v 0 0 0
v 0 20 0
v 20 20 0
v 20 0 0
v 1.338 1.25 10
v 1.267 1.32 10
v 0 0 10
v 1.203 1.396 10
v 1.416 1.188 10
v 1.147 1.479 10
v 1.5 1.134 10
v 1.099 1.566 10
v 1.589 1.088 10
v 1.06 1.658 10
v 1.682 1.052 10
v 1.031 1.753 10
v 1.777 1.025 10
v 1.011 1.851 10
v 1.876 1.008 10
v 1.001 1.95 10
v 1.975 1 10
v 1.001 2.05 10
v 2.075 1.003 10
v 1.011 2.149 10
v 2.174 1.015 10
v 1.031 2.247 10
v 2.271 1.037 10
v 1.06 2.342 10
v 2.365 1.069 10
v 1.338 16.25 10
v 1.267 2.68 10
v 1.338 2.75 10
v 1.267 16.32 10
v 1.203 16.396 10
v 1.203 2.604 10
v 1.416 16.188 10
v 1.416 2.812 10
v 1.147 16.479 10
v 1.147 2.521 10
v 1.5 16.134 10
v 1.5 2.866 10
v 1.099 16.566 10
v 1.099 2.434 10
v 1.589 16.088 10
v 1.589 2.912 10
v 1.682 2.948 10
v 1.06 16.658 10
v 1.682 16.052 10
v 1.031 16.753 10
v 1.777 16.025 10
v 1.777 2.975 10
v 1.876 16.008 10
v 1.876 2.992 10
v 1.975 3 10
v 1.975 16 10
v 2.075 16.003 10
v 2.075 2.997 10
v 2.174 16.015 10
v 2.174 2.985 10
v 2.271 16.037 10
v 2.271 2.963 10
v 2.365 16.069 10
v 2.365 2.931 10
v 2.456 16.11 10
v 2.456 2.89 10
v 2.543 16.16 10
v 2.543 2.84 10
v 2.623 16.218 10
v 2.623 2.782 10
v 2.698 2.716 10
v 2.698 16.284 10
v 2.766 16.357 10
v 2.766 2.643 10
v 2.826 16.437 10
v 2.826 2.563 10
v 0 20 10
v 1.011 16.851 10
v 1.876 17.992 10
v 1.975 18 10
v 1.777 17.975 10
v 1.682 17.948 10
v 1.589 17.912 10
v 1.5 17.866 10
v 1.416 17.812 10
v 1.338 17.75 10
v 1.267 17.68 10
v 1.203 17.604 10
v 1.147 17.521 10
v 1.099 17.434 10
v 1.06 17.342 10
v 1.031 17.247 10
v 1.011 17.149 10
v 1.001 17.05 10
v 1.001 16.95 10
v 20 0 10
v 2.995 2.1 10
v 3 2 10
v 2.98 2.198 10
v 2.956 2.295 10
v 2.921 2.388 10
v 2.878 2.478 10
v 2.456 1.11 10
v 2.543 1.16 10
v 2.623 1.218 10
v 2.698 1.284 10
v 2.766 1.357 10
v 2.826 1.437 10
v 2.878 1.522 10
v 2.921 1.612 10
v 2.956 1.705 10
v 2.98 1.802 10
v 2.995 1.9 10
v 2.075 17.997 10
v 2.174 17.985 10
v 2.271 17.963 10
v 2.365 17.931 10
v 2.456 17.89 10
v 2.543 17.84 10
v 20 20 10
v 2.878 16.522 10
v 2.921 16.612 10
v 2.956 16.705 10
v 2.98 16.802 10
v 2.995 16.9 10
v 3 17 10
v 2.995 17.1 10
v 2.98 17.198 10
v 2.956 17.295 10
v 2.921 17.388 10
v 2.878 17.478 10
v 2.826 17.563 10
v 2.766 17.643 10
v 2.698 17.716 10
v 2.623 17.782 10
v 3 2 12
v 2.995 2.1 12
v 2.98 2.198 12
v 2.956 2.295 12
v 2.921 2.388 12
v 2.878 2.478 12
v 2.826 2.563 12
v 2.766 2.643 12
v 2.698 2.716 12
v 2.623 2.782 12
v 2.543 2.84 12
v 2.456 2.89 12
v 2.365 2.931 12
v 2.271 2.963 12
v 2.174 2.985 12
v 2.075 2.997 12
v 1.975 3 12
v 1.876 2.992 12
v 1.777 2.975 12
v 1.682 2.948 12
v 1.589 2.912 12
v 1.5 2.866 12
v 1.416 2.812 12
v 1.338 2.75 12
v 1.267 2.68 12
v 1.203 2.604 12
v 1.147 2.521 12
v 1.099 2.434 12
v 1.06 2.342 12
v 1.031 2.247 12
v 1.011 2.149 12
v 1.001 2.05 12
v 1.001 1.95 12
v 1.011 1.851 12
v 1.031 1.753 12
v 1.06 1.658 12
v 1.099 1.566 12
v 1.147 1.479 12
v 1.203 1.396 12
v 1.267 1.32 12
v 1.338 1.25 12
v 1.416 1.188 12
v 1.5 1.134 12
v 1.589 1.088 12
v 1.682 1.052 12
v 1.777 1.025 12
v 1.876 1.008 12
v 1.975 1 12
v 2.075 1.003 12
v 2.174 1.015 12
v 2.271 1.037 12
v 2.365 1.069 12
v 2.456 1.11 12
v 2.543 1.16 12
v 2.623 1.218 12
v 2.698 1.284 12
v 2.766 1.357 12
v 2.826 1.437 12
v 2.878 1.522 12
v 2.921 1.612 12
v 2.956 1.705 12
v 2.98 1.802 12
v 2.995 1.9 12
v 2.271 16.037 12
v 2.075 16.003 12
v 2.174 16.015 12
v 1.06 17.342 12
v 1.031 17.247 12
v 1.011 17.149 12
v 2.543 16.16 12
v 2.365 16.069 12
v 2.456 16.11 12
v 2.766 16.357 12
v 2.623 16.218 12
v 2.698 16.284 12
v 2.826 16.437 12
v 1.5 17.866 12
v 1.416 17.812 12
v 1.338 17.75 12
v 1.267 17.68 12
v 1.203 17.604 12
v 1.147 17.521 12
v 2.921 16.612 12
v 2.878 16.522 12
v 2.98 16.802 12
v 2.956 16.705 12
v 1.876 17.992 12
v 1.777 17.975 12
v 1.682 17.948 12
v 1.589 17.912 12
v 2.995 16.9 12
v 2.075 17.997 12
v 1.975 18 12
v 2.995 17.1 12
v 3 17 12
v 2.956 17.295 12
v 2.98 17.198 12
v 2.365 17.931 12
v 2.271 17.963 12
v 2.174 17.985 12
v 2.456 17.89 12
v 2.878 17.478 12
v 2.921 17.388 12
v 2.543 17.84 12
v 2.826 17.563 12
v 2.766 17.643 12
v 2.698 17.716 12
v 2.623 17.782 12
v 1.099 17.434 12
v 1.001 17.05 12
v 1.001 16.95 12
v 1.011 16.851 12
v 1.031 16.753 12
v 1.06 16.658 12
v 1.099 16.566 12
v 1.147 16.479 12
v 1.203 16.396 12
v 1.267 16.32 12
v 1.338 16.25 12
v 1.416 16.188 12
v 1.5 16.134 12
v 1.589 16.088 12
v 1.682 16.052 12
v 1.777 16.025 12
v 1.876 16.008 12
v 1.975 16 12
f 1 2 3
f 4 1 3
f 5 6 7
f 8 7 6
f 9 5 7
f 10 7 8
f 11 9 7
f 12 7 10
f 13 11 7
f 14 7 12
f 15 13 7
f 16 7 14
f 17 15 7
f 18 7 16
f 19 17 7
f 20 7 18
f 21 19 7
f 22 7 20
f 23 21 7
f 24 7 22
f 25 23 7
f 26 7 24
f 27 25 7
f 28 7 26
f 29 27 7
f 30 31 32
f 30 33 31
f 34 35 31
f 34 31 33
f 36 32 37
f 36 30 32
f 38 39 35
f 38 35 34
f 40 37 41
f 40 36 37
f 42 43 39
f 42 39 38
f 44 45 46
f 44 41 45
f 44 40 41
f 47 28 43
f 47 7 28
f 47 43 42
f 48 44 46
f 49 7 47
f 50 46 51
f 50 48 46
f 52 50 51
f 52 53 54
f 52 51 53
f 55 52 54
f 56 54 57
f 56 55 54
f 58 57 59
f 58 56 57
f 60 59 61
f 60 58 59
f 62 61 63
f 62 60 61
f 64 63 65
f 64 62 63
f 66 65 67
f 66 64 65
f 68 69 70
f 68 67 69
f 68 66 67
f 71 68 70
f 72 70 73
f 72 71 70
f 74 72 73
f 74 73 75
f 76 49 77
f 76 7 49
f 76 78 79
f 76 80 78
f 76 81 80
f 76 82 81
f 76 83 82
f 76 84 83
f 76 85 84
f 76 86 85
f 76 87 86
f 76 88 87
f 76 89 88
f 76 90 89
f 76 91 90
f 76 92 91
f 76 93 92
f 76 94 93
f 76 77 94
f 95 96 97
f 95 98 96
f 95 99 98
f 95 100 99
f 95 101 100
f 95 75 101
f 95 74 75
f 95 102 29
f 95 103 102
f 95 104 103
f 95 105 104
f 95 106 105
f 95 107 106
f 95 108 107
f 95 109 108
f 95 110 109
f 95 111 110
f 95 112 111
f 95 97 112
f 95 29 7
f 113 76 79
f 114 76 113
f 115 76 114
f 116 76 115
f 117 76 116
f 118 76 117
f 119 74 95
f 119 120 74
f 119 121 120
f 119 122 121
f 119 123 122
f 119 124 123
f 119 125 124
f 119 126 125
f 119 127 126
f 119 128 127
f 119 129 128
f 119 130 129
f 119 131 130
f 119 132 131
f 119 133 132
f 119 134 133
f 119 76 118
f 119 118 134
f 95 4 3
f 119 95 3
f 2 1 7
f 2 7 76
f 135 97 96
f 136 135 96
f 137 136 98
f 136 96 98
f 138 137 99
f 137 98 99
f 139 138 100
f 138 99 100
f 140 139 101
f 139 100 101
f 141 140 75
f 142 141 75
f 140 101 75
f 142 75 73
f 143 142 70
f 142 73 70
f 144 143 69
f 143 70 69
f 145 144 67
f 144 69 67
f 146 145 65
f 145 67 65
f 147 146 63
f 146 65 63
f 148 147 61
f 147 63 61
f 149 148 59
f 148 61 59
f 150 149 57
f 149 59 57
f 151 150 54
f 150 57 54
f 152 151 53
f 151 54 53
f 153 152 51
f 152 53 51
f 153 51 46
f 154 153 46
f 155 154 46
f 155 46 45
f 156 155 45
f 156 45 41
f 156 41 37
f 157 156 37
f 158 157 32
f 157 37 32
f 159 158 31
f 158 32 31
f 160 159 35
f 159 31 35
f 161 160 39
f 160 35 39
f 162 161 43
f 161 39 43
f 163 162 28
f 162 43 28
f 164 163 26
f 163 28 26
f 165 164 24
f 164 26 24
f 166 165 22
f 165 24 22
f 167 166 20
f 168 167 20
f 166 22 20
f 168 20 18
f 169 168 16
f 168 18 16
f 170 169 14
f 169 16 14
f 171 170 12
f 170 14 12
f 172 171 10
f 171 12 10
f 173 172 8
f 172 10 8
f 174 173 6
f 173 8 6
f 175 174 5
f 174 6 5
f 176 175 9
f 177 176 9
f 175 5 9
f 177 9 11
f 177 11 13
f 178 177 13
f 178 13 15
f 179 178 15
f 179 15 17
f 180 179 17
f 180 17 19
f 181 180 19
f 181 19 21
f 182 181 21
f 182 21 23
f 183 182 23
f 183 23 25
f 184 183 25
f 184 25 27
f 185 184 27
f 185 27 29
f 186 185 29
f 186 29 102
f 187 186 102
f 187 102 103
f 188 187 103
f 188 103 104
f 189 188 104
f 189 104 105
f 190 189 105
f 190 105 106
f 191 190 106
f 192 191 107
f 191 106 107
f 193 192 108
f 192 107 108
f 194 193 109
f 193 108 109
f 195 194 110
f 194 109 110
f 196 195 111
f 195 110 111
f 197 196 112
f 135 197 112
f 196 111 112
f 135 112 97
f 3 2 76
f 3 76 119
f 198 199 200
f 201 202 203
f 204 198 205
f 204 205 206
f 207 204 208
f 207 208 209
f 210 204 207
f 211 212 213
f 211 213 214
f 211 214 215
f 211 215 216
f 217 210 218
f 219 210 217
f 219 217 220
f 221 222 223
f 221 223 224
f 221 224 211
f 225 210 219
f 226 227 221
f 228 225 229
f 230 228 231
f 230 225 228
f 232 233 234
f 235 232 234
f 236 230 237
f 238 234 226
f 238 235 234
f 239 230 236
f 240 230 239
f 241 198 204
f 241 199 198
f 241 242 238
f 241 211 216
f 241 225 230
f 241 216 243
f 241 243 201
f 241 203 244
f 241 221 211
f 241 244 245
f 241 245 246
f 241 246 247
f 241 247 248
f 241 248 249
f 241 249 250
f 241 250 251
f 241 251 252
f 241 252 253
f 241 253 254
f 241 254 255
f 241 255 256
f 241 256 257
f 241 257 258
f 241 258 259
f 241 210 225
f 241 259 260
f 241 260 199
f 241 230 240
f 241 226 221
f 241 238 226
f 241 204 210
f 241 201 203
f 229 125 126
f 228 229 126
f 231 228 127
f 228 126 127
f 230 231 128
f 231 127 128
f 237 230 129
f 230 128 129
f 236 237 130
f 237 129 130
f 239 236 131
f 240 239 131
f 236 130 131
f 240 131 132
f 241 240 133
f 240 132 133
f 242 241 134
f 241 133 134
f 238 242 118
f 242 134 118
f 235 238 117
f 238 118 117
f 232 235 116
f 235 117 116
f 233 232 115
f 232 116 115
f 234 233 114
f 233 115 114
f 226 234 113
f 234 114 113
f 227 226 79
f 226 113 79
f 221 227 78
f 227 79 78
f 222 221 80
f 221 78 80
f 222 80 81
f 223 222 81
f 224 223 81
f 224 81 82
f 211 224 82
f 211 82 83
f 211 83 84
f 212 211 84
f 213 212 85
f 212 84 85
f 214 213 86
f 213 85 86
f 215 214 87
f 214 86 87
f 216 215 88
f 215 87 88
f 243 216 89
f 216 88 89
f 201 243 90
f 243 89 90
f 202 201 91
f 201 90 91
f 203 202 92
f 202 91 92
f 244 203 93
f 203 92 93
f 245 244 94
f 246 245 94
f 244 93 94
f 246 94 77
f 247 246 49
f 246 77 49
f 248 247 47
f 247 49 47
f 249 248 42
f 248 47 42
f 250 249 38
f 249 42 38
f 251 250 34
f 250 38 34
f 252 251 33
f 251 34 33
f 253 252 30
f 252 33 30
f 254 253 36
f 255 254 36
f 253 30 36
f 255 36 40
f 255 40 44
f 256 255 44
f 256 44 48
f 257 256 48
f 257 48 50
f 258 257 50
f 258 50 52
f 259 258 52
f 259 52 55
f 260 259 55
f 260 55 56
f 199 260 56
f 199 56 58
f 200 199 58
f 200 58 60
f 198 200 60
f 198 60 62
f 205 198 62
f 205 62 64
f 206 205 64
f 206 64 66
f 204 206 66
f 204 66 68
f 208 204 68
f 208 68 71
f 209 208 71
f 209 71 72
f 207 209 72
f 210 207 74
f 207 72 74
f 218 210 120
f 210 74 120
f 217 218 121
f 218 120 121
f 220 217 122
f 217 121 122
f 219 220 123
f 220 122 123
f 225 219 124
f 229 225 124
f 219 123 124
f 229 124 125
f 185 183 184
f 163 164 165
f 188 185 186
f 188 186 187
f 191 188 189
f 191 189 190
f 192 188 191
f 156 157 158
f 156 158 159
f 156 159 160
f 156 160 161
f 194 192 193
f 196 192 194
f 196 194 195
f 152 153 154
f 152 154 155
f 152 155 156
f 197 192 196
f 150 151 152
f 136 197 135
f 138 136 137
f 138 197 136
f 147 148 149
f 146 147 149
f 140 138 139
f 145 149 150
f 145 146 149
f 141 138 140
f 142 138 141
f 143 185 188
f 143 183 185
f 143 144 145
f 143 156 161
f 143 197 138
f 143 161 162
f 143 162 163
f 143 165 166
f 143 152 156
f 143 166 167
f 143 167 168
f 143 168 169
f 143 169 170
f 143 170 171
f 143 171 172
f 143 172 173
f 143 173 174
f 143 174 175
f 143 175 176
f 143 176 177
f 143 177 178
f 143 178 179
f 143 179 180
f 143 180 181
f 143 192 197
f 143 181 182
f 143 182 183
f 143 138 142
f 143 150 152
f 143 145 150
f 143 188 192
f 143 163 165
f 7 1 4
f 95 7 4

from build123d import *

# Parameters (mm, degrees)
SKETCH_1_W               = 20
SKETCH_1_H               = 20
BASEBOX_DEPTH            = 10
SKETCH_2_R               = 1
BOSSSEED_DEPTH           = 2
LINEARPATTERN_COUNT      = 2
LINEARPATTERN_PITCH      = 10
LINEARPATTERN_COUNT_DIR2 = 3
LINEARPATTERN_PITCH_DIR2 = 15


with BuildPart() as part:
    # 草图1 → BaseBox (new body)
    with BuildSketch(Plane.XY):
        with Locations((10, 10)):
            Rectangle(SKETCH_1_W, SKETCH_1_H)
    extrude(amount=BASEBOX_DEPTH)

    # 草图2 → BossSeed (add)
    with BuildSketch(Plane.XY.offset(10)):
        with Locations((2, 2)):
            Circle(SKETCH_2_R)
    bossseed = extrude(amount=BOSSSEED_DEPTH)

    # LinearPattern: BossSeed 2 × 3, 4 skipped
    with Locations(*[(-i * LINEARPATTERN_PITCH, j * LINEARPATTERN_PITCH_DIR2, 0) for i in range(LINEARPATTERN_COUNT) for j in range(LINEARPATTERN_COUNT_DIR2) if (i, j) not in ((0, 0), (0, 2), (1, 0), (1, 1), (1, 2))]):
        add(bossseed)


solid = part.part
